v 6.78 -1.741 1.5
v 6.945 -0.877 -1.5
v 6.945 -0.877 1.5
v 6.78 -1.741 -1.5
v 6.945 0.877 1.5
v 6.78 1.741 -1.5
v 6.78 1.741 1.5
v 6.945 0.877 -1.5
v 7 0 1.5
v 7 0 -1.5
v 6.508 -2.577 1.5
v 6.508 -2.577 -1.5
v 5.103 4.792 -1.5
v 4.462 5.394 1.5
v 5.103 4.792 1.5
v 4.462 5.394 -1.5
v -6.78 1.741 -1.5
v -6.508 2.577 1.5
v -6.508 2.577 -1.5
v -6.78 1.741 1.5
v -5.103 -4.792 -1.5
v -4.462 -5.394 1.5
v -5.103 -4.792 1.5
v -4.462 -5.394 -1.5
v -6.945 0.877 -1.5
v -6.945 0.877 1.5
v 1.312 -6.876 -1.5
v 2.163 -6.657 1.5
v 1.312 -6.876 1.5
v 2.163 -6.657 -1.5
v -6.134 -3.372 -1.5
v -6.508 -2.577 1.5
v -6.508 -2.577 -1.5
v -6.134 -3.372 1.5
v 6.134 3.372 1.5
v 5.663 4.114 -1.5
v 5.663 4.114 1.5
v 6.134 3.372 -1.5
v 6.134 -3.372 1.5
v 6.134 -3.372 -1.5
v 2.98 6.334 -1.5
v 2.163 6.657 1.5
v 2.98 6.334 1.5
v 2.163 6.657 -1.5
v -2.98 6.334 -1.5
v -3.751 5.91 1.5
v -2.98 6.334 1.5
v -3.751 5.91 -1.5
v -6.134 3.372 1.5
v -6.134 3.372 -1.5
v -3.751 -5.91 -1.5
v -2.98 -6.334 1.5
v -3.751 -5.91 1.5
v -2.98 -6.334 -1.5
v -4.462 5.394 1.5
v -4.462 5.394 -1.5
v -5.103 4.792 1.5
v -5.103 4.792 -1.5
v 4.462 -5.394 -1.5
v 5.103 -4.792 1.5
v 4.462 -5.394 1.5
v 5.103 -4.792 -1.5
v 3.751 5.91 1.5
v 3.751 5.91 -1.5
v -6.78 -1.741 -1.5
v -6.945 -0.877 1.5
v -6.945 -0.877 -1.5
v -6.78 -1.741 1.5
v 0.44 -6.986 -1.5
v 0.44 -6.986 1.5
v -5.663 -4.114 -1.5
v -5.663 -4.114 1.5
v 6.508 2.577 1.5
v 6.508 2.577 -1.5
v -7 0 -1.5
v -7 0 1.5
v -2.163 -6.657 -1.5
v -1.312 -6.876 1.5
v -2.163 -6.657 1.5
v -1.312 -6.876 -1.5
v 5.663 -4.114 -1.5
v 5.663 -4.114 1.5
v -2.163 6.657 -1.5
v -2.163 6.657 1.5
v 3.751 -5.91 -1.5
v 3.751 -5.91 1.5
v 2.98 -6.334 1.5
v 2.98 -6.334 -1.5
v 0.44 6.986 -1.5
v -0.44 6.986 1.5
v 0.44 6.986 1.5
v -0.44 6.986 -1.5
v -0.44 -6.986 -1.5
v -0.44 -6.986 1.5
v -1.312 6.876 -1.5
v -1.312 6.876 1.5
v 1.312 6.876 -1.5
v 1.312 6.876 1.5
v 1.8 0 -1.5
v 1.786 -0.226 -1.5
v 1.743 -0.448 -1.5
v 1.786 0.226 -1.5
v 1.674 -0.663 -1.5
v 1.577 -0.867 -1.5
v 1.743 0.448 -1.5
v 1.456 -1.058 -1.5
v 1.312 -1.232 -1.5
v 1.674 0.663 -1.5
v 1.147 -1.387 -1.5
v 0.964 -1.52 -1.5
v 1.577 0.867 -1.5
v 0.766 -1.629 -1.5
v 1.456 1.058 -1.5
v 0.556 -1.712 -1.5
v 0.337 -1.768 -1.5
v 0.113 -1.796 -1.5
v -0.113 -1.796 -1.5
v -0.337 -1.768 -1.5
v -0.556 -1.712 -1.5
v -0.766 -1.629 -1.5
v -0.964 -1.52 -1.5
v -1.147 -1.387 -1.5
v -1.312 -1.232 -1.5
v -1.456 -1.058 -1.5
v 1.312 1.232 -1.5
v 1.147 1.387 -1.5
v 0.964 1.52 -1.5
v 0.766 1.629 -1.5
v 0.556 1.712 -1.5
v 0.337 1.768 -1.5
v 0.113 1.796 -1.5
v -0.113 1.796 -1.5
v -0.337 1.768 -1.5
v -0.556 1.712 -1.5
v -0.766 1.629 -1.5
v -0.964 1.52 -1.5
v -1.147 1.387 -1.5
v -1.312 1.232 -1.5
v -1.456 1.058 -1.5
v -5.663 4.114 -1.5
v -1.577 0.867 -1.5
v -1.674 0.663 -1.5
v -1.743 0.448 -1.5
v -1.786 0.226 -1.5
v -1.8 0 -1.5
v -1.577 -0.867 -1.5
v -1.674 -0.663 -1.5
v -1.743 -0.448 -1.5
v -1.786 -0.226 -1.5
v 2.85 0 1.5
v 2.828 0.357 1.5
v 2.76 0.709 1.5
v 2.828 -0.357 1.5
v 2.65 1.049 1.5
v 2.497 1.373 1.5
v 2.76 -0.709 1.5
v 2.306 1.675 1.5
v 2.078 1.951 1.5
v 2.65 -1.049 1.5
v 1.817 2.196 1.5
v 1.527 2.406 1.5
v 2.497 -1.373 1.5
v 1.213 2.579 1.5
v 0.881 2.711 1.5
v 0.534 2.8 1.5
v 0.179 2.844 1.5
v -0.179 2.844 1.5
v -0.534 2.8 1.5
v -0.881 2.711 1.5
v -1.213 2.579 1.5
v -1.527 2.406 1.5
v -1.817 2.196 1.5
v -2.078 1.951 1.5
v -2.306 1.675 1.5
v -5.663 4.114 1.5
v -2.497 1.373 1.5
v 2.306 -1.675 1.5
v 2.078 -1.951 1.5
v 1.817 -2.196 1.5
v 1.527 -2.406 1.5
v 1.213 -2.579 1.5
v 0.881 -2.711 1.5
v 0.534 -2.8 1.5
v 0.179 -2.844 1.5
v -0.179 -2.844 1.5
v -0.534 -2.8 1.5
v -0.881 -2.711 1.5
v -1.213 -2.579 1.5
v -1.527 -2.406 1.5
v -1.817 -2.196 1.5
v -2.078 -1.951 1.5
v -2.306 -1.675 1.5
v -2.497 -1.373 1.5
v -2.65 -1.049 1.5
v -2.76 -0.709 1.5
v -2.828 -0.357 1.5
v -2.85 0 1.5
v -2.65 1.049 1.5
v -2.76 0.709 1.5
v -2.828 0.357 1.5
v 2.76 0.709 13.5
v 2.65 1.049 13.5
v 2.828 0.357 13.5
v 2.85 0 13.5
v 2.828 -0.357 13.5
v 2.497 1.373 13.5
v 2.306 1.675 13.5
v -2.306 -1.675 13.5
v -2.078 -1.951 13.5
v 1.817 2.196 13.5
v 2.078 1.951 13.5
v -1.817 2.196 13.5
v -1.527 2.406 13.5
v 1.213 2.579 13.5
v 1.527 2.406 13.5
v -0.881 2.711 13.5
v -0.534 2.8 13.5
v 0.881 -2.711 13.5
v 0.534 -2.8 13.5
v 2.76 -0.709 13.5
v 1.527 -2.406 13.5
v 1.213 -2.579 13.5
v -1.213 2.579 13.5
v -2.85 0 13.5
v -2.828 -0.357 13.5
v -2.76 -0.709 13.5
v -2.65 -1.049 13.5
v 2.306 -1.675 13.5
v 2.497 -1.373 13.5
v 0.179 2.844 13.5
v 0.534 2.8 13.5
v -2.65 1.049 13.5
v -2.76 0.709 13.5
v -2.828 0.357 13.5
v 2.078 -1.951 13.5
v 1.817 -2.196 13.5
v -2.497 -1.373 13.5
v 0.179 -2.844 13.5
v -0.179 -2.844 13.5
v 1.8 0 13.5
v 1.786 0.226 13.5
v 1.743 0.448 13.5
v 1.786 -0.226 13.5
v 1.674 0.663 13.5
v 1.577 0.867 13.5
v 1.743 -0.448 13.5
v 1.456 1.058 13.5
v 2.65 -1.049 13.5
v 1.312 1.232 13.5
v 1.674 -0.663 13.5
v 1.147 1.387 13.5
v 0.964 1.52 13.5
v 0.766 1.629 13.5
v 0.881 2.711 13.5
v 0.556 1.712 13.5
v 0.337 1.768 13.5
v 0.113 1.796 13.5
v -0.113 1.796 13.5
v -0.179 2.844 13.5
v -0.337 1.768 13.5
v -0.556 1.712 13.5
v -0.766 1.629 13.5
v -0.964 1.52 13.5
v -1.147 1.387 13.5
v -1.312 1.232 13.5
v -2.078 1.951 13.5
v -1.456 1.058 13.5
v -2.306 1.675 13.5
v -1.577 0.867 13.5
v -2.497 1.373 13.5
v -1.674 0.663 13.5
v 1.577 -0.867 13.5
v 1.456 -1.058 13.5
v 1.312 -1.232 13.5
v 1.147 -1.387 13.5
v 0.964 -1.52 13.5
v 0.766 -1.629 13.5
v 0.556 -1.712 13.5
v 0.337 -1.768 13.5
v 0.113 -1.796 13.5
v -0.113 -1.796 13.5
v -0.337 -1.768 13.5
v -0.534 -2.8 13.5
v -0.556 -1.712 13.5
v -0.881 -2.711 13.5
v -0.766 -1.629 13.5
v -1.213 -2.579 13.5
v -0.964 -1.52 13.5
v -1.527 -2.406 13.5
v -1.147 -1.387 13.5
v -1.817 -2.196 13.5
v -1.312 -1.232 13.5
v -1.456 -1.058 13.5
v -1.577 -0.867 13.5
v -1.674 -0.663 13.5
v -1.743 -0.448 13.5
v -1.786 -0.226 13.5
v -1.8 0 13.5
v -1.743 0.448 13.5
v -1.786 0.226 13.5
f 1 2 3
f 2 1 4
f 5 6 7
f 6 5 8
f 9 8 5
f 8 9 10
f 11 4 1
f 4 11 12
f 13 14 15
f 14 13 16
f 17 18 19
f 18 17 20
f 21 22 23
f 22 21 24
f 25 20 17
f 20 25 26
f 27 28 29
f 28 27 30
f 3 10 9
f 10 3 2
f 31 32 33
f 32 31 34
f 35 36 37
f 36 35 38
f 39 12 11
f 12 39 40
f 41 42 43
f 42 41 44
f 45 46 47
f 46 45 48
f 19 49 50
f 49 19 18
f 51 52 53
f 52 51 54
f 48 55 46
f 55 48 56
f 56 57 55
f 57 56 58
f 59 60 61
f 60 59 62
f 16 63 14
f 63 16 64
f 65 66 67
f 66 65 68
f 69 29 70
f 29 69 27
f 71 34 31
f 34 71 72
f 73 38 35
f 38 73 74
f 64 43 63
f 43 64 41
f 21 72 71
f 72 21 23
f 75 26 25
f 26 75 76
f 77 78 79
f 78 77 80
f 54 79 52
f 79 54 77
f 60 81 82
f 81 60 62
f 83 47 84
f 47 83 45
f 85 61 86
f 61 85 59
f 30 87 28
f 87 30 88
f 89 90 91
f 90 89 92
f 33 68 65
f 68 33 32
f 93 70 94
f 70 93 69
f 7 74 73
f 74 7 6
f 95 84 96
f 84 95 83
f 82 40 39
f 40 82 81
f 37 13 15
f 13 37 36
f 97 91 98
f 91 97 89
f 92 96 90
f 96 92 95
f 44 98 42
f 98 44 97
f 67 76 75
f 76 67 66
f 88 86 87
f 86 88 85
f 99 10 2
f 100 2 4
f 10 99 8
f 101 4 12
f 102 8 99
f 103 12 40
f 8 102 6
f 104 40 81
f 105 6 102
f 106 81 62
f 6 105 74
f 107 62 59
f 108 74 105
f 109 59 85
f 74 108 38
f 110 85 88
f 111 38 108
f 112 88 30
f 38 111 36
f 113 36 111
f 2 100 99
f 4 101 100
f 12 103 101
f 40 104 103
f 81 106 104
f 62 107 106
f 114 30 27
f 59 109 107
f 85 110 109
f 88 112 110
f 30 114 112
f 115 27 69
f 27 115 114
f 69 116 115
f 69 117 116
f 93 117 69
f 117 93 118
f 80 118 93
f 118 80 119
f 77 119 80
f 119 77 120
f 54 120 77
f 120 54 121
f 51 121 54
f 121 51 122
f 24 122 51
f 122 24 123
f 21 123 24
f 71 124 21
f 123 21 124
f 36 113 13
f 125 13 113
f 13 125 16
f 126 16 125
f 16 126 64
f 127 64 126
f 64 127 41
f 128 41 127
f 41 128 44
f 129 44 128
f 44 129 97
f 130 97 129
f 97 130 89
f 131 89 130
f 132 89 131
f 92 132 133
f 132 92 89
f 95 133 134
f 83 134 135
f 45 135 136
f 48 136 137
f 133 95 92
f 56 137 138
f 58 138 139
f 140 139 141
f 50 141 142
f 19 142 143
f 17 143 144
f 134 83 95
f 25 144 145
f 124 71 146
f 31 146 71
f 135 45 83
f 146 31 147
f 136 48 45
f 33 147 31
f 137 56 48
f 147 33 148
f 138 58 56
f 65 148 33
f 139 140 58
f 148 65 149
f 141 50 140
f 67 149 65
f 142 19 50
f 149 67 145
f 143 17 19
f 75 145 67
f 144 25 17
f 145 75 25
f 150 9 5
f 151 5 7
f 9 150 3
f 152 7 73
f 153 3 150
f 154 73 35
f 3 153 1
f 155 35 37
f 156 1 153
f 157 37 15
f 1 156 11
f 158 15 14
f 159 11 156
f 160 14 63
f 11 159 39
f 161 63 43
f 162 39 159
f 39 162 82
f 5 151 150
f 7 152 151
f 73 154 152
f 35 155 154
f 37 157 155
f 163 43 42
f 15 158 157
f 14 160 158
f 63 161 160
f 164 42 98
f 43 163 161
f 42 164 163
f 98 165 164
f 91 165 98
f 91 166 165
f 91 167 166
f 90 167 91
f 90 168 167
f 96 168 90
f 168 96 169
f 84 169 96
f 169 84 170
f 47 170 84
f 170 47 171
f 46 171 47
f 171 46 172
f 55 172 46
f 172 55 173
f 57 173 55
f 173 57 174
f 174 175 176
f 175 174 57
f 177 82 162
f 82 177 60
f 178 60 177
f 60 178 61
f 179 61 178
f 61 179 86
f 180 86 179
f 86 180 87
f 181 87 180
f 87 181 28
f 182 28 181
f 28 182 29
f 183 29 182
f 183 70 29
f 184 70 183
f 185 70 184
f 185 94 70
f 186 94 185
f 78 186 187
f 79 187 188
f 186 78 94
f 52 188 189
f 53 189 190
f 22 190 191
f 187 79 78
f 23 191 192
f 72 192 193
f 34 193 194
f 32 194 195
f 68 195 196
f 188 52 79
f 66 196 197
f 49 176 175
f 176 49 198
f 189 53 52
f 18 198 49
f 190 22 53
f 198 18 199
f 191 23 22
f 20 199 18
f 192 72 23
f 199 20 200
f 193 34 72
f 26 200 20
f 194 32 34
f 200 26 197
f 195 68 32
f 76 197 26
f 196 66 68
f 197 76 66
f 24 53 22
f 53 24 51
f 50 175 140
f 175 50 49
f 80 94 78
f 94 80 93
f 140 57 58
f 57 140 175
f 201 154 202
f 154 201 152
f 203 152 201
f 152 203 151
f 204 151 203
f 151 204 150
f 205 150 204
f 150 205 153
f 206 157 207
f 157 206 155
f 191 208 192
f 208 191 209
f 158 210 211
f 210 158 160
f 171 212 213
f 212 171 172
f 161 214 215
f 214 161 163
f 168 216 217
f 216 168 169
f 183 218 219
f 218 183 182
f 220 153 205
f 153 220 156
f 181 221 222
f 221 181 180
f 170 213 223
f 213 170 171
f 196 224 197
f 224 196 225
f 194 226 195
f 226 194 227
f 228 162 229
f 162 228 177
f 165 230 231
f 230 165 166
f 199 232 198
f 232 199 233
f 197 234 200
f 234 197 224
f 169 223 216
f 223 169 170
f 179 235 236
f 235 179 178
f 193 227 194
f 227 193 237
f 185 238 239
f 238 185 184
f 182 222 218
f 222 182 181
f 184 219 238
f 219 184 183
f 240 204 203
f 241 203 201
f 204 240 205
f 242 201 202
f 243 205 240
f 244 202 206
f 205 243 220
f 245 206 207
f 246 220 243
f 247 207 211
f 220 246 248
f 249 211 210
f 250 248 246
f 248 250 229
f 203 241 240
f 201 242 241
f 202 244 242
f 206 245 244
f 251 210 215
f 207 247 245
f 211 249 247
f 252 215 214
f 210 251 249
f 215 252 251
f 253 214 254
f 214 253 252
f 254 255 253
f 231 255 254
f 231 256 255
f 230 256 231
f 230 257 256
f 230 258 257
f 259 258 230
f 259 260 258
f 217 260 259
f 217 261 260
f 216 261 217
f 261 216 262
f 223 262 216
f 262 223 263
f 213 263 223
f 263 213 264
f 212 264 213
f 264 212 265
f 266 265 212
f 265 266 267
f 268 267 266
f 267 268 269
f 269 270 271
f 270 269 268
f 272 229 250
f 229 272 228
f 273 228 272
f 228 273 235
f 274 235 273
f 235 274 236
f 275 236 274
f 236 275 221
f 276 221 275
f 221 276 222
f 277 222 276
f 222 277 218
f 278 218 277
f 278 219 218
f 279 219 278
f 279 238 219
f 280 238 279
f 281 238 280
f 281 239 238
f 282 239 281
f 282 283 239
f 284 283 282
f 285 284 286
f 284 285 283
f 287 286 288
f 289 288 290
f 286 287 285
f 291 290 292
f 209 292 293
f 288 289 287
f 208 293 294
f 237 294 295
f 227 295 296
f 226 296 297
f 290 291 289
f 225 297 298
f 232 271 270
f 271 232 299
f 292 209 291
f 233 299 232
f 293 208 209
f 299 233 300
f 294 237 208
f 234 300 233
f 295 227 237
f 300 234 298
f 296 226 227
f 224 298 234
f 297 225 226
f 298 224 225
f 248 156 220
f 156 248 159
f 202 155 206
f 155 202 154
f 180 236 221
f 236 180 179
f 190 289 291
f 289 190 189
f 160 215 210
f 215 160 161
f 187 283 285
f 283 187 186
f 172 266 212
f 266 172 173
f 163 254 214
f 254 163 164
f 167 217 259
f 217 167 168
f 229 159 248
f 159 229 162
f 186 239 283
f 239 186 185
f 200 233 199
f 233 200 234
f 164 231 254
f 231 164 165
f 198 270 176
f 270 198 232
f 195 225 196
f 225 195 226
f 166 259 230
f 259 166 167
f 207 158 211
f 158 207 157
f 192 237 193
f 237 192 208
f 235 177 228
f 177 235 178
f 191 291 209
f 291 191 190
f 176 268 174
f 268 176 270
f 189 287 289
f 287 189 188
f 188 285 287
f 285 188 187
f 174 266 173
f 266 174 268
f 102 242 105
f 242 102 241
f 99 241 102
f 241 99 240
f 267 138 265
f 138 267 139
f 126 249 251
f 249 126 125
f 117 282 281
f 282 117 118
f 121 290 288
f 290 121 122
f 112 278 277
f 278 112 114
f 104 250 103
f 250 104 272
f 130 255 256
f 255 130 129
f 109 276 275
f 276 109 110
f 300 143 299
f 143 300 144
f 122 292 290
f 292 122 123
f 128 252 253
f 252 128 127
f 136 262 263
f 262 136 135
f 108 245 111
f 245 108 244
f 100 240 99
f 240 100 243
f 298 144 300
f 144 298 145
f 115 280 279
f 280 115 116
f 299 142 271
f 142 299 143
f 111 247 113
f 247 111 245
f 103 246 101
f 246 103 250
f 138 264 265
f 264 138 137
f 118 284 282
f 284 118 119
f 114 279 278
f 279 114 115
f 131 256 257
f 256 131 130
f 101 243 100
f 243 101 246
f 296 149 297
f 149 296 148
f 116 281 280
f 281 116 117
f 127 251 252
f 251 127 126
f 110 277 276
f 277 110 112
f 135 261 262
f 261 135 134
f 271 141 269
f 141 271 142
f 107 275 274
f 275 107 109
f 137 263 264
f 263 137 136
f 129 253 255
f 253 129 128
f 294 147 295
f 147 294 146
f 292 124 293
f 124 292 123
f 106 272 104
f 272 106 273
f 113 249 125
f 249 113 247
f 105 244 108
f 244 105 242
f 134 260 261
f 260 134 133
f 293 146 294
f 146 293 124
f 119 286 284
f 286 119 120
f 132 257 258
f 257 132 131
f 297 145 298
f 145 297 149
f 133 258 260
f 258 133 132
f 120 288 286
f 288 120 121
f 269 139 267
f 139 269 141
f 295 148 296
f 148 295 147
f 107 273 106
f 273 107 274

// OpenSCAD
$fn = 50;


difference() {
	union() {
		translate(v = [0, 0, -1.5000000000]) {
			cylinder(h = 3, r = 7.0000000000);
		}
		translate(v = [0, 0, -1.5000000000]) {
			cylinder(h = 15, r = 2.8500000000);
		}
	}
	union() {
		translate(v = [0, 0, -50.0000000000]) {
			cylinder(h = 100, r = 1.8000000000);
		}
	}
}
